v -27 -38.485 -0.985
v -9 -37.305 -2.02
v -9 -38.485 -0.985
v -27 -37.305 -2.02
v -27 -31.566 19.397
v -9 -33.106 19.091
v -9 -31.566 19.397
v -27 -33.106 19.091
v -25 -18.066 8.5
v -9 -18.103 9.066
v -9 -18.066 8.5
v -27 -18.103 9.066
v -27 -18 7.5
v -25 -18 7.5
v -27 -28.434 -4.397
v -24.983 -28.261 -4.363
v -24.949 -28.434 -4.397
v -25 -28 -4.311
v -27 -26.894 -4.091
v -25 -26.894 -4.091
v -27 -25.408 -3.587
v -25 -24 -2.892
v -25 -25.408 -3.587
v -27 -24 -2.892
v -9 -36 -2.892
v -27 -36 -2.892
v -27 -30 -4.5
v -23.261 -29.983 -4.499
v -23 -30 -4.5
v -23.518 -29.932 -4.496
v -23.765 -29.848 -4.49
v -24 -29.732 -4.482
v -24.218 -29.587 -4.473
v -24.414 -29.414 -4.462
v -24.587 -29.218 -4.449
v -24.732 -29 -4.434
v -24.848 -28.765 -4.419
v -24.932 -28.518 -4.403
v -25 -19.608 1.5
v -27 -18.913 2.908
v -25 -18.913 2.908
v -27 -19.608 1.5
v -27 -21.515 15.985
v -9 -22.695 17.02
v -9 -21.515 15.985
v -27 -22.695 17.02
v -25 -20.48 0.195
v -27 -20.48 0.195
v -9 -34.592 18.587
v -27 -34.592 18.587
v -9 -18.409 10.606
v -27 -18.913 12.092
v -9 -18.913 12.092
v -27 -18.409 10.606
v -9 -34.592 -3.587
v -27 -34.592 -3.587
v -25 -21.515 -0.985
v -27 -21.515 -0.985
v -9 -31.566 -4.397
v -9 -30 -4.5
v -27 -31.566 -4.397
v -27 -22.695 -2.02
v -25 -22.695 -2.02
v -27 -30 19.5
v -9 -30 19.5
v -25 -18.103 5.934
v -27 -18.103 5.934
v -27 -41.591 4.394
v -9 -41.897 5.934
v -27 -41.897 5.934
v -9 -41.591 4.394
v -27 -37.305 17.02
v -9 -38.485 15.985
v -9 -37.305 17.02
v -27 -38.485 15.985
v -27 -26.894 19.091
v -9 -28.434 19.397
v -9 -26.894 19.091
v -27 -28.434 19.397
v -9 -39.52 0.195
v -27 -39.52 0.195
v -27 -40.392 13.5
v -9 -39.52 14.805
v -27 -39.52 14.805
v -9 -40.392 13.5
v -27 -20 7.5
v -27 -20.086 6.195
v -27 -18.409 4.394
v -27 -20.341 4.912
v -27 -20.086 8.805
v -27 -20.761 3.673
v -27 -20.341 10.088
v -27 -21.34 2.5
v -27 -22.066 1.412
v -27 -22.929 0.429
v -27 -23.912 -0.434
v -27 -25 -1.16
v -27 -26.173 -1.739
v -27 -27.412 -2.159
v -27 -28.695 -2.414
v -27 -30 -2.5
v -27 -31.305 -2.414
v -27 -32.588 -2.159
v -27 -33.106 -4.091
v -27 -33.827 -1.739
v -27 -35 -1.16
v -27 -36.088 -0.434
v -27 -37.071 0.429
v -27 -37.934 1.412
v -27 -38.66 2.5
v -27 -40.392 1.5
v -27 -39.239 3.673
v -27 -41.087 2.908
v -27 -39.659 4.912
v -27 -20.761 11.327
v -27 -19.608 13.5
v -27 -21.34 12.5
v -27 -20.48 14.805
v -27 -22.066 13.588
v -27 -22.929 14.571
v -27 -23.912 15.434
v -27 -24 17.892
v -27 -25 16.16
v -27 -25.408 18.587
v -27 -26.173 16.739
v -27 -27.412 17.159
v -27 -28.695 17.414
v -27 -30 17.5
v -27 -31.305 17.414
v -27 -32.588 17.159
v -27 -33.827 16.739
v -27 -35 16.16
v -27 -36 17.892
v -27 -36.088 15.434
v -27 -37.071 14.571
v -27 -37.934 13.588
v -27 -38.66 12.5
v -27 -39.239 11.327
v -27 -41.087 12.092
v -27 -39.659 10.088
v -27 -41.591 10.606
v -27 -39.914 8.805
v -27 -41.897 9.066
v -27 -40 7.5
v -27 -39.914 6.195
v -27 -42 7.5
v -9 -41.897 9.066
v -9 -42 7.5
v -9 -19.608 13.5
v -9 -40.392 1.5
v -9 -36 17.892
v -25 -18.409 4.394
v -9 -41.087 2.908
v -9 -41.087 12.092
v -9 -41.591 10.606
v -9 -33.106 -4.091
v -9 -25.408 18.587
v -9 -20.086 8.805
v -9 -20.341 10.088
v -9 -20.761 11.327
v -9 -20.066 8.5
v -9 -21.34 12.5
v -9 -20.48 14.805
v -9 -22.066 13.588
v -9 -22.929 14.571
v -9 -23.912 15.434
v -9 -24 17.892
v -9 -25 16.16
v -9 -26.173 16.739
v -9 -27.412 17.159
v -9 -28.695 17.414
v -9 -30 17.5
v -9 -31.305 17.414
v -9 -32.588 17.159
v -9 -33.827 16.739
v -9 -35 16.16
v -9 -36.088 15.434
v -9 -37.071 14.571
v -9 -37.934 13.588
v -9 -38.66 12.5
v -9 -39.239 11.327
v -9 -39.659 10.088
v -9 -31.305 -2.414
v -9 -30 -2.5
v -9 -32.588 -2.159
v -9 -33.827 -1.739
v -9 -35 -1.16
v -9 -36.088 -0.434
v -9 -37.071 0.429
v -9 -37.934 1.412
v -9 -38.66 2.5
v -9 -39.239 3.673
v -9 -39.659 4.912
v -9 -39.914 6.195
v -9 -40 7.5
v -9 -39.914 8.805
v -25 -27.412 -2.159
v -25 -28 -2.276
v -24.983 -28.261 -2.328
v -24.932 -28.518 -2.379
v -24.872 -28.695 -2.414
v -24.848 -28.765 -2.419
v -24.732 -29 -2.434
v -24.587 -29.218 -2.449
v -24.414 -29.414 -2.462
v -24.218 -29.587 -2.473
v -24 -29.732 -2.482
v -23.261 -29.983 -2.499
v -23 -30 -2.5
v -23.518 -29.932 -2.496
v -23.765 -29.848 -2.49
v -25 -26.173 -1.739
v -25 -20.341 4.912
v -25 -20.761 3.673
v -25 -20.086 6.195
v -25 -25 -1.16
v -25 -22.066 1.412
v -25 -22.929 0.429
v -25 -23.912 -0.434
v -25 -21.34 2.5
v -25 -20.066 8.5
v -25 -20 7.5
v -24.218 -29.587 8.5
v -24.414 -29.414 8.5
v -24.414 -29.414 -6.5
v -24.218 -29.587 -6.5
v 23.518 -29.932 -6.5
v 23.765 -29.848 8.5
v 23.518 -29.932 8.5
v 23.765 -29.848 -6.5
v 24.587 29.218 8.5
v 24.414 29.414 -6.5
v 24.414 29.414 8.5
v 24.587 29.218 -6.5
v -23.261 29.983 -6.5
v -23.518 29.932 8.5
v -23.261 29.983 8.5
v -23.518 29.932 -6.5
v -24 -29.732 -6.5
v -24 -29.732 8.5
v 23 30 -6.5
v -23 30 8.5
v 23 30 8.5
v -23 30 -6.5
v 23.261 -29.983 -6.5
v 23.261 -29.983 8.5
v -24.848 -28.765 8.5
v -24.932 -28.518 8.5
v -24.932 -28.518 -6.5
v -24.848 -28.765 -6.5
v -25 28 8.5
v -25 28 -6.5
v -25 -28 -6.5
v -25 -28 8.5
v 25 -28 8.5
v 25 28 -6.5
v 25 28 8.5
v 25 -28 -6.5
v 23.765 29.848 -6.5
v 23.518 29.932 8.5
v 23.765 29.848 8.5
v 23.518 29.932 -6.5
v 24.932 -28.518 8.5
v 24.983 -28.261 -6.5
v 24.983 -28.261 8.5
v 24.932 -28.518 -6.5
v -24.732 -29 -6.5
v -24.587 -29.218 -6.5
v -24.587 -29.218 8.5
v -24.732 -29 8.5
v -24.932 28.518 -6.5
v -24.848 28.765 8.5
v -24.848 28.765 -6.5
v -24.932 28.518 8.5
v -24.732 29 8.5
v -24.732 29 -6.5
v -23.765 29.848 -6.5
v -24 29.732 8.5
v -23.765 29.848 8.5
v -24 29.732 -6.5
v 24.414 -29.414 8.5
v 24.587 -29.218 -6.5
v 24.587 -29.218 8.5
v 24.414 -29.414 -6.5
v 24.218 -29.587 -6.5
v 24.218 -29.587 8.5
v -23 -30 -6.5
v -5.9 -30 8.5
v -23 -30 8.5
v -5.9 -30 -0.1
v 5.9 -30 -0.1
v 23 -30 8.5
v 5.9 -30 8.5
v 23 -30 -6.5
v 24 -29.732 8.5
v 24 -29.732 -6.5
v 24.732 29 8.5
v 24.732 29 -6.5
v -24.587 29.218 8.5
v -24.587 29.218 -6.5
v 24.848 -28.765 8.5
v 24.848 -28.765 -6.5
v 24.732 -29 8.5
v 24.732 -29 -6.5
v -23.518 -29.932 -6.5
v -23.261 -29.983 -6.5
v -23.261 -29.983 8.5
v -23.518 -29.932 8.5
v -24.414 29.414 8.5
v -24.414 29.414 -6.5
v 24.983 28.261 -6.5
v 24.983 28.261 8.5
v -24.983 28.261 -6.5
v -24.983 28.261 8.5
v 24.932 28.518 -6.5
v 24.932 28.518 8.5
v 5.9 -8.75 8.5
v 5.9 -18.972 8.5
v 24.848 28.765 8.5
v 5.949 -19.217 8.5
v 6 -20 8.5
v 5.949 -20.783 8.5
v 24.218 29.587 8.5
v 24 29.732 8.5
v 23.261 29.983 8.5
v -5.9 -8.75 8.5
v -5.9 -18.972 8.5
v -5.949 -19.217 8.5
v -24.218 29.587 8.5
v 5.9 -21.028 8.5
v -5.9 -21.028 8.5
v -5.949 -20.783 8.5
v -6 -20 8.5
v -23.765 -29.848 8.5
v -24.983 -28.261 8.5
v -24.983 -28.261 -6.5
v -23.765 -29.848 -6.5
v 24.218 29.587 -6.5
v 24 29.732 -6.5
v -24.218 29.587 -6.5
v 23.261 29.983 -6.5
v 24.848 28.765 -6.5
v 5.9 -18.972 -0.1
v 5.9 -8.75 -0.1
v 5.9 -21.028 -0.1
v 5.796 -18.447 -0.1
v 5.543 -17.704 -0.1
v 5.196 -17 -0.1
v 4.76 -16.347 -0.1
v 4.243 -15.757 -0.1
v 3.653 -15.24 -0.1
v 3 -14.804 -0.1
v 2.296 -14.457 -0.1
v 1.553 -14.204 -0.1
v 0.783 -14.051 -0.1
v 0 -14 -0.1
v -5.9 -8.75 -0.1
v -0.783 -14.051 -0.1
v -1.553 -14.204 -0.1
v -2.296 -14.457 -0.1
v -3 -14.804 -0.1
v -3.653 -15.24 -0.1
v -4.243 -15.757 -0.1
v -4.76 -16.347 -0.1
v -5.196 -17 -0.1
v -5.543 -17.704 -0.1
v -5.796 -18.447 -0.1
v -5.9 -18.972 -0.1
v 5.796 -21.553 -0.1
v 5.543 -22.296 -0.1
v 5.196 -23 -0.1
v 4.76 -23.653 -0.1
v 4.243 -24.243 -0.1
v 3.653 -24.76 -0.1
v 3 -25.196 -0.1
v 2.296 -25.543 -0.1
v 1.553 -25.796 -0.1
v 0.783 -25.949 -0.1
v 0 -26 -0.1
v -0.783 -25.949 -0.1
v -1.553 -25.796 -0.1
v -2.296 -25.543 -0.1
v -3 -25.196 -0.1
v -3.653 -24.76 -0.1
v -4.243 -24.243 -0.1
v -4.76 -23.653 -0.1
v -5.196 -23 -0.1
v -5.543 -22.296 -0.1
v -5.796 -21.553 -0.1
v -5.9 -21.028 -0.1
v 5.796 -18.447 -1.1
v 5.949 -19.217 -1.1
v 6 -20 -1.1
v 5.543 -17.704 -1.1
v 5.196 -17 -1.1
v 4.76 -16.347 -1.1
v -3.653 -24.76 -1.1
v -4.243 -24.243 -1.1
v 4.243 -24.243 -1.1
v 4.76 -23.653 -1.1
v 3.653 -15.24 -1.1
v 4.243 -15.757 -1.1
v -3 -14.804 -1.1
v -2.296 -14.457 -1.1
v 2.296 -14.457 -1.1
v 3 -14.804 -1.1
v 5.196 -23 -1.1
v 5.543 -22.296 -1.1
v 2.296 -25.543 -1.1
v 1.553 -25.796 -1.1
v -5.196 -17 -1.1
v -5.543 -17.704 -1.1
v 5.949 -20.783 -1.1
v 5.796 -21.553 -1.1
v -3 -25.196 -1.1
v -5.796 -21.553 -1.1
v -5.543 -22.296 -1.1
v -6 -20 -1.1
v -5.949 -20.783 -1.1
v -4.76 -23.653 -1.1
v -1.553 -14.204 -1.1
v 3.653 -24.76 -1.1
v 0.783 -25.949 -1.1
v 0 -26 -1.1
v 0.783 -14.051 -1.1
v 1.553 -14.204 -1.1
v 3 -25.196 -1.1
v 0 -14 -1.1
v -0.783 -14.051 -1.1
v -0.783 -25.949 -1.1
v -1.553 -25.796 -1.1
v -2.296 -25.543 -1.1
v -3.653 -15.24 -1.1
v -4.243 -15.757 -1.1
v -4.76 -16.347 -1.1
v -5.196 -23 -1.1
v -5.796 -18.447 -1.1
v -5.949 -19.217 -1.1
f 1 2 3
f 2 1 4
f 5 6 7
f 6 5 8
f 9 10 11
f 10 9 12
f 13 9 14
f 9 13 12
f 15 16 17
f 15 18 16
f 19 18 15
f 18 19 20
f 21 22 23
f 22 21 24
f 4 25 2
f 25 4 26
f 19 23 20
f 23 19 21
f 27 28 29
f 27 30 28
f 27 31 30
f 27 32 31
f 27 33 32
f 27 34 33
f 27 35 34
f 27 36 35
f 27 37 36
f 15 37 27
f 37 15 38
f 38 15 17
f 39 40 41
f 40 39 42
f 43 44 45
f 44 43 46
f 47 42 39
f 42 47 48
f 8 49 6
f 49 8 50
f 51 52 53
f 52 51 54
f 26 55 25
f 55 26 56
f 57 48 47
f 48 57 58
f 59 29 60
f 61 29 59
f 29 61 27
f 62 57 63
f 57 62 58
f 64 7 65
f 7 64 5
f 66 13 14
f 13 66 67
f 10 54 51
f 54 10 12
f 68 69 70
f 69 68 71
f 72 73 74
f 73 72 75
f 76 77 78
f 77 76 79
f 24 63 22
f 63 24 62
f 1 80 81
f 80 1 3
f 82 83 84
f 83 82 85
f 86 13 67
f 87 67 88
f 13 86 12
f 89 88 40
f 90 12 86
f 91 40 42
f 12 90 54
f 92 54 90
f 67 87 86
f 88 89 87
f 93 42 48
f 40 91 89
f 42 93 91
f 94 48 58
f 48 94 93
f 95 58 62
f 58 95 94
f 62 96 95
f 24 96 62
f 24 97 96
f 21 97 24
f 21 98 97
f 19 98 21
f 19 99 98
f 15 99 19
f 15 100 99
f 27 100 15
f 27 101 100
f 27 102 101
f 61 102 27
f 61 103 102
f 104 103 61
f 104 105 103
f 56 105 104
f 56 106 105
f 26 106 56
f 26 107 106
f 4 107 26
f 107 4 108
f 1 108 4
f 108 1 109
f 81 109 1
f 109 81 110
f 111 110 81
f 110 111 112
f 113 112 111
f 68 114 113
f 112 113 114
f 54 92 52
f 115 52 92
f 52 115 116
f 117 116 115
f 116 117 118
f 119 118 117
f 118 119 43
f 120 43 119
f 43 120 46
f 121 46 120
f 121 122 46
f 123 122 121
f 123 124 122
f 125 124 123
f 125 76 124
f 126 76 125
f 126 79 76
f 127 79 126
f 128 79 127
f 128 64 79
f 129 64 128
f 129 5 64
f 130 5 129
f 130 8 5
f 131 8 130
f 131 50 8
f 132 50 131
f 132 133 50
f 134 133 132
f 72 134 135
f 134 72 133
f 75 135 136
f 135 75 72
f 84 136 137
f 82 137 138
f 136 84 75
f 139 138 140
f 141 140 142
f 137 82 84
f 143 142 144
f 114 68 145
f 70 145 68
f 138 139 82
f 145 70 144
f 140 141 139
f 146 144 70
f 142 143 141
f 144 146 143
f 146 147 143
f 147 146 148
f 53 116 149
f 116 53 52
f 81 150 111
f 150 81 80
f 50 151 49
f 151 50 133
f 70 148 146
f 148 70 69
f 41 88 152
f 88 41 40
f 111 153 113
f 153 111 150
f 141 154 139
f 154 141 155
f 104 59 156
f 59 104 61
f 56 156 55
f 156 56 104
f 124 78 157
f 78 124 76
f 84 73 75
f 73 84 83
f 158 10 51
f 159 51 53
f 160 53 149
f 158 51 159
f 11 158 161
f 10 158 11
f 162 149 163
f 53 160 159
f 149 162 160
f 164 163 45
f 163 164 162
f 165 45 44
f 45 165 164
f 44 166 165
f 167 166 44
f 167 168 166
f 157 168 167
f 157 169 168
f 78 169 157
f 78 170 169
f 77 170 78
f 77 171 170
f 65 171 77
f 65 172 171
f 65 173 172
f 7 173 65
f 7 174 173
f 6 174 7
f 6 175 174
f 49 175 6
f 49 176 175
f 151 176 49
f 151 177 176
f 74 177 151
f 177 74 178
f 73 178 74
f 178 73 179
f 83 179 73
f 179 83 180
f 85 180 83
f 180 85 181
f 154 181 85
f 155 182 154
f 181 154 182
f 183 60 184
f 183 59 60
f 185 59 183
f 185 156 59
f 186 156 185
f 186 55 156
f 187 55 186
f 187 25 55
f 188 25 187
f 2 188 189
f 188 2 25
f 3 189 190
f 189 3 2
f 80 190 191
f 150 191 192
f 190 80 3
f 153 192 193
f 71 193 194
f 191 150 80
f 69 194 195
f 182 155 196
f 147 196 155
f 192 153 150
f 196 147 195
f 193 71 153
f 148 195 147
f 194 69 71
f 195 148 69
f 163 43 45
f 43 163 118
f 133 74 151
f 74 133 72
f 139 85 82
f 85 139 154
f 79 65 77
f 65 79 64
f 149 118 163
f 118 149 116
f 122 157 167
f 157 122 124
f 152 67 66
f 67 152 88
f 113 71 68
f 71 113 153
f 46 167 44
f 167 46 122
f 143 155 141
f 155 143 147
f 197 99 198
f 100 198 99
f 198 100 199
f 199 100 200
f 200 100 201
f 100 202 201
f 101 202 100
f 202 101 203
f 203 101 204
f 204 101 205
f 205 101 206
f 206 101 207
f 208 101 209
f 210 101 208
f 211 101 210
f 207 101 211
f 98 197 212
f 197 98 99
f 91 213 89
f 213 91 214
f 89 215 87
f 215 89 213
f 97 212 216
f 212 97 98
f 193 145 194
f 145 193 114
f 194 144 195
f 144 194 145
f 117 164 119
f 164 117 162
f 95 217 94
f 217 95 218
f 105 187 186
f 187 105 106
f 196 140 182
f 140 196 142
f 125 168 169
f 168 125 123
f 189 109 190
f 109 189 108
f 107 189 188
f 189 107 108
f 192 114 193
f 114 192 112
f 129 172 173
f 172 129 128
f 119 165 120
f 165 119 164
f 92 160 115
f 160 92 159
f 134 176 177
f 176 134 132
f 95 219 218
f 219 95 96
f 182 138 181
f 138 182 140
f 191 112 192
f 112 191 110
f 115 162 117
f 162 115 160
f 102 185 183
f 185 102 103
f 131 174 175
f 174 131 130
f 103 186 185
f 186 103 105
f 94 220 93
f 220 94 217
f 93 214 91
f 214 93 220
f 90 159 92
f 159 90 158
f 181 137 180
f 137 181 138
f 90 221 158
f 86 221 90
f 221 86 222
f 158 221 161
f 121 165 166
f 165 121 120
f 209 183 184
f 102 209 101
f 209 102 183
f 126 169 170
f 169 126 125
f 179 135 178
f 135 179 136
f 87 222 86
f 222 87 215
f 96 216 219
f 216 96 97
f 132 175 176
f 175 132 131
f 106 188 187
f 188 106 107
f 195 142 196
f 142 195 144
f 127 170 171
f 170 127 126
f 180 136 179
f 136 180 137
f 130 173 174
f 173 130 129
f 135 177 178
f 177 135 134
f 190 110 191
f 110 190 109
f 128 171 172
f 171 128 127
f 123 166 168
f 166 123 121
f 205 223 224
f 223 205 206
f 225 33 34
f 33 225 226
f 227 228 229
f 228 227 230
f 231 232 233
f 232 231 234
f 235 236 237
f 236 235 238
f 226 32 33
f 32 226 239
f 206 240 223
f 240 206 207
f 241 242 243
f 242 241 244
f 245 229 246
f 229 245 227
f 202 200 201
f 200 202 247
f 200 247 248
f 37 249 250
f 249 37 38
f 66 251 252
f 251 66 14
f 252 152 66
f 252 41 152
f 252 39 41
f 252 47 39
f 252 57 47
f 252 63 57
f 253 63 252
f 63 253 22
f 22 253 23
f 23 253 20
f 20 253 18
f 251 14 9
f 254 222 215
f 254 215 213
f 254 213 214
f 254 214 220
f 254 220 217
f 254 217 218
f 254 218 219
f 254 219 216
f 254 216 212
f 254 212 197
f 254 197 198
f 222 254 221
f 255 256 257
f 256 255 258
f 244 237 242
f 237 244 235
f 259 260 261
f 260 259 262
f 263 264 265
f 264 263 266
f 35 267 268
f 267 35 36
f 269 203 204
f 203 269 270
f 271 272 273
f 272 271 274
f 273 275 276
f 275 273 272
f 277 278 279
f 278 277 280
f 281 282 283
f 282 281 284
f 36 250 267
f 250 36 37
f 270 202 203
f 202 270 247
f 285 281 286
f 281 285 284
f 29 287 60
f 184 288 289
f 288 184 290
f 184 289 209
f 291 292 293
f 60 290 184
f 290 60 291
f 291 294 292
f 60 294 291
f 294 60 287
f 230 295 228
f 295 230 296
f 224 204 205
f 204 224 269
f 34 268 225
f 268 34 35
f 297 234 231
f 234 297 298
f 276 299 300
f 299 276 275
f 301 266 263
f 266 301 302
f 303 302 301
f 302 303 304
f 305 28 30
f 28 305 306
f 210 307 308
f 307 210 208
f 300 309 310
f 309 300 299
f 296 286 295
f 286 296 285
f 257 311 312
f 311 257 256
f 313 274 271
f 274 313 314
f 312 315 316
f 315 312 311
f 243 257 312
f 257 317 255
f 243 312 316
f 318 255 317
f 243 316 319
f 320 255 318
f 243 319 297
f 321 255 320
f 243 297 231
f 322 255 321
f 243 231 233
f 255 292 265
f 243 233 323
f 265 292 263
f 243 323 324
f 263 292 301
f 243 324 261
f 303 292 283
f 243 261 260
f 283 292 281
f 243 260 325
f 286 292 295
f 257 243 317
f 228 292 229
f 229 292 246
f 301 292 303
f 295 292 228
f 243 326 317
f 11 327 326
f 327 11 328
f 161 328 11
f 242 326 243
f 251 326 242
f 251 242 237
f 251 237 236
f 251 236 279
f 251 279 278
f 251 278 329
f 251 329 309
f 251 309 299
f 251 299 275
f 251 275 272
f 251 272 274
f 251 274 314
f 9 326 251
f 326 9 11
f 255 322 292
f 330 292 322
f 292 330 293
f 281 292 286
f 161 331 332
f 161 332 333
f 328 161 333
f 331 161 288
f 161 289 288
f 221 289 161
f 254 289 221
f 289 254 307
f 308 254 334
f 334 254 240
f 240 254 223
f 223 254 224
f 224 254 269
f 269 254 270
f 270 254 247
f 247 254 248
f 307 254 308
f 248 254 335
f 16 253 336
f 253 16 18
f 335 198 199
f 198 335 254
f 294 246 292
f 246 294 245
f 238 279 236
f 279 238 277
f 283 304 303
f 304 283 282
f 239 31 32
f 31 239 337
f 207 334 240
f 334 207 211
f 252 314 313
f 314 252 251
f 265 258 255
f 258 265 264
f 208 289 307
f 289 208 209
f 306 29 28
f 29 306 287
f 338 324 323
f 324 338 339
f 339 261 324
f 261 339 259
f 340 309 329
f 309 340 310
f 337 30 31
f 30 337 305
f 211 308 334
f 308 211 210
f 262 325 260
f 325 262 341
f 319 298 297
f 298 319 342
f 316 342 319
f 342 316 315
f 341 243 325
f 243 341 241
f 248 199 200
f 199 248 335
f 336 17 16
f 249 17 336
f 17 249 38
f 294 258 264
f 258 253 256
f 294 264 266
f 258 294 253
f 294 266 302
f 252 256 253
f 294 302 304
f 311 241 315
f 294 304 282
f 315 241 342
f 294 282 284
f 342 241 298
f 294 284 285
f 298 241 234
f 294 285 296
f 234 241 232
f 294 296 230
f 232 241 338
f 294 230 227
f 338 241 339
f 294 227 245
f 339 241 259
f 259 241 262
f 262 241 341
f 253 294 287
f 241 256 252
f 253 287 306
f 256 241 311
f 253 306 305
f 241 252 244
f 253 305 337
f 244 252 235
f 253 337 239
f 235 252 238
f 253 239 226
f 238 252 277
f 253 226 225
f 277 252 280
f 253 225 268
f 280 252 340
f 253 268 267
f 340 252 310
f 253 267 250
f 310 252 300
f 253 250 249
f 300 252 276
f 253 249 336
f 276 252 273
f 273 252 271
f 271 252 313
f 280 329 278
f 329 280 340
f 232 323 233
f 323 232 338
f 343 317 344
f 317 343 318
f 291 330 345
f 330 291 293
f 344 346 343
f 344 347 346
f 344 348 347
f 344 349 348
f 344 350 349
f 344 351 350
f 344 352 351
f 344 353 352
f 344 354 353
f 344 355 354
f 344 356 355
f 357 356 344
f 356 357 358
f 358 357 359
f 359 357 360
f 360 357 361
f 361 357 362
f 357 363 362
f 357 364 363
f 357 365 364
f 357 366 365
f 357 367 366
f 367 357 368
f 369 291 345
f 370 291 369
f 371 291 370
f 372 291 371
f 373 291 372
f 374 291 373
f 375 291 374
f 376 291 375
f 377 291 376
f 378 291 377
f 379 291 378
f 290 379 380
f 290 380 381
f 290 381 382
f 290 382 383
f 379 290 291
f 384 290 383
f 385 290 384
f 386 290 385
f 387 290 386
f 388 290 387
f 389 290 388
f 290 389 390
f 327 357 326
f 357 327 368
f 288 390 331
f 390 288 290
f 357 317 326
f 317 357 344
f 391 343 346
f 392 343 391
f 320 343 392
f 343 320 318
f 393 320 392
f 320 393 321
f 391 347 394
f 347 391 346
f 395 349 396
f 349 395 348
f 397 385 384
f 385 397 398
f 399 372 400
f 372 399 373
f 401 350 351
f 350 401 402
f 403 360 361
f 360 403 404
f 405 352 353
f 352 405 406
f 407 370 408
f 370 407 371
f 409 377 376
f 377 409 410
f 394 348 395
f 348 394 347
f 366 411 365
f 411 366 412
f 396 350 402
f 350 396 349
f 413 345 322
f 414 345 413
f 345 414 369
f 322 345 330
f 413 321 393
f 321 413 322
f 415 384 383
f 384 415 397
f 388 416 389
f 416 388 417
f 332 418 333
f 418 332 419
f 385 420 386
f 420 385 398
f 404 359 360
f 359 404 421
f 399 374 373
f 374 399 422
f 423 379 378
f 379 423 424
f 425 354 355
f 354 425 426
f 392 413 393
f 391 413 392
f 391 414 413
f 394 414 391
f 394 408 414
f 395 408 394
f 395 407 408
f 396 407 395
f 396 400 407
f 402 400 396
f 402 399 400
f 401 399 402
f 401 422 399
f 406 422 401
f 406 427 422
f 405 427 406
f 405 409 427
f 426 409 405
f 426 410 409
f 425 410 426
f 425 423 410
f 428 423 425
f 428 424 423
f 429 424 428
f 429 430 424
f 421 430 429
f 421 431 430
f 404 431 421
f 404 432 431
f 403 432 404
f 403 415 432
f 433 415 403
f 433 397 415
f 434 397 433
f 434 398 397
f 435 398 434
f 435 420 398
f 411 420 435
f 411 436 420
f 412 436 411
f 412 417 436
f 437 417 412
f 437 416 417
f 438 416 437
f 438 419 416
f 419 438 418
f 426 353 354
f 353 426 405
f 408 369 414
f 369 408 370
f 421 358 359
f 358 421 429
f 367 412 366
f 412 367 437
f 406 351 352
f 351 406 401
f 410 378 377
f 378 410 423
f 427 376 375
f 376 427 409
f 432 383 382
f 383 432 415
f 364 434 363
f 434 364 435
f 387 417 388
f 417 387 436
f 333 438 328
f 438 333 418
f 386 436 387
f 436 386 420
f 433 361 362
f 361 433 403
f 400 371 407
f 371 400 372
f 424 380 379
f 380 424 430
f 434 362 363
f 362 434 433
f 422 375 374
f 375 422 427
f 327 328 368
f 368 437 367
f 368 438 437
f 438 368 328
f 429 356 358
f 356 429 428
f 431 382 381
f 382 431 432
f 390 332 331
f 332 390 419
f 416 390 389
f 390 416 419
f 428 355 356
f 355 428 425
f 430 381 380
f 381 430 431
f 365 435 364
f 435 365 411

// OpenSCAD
// ============================================================
// Palm Structure — Tendon-Driven Robotic Hand
// ============================================================
// Houses a single MG90S servo that drives all three finger
// tendons simultaneously via a central tendon pulley.
//
// Dimensions  :  60 mm (L) × 50 mm (W) × 15 mm (H)
// Servo mount : MG90S (22.5 × 11.8 × 22.7 mm body)
// Finger sockets: 3 × rectangular slots along distal edge
// Tendon channels: 3 smooth internal paths from servo pulley
//                  exit to finger socket entry holes
// Forearm mount : 20 mm PVC pipe receiver on proximal face
// ============================================================

// ---- Parameters -------------------------------------------
palm_l      = 60;    // mm — palm length (proximal–distal)
palm_w      = 50;    // mm — palm width (finger spread)
palm_h      = 15;    // mm — palm thickness
wall        =  2;    // mm — minimum wall

// MG90S servo dimensions
srv_l       = 22.5;
srv_w       = 11.8;
srv_h       = 22.7;
srv_tab_l   = 32;    // mm — tab-to-tab length
srv_tab_h   =  2.5;  // mm — tab thickness
srv_tab_w   =  4;    // mm — tab width (mounting ear)

// Finger socket (fits finger proximal-lug width + tolerance)
finger_w    = 11;    // mm — socket width
finger_h    =  8;    // mm — socket height
finger_sep  = 13;    // mm — centre-to-centre spacing
n_fingers   =  3;

// Tendon routing hole in palm exit (slightly larger than finger tendon hole)
tendon_hole_dia  =  1.6;  // mm — slightly larger than 1.35 mm

// PVC pipe receiver (forearm attachment, proximal face)
pvc_od      = 20;    // mm — PVC outer diameter
pvc_wall    =  2;    // mm — receiver socket wall

// Pin holes for finger segment attachment
pin_dia     =  2.0;
pin_tol     =  0.1;

// Pulley post (servo horn connector reference point)
pulley_x    =  0;    // centred in X
pulley_y    = 10;    // mm from proximal edge (centre of servo bay)
pulley_z    = palm_h + 2;  // mm — above palm top surface (horn height)
pulley_r    =  6;    // mm — effective tendon wrap radius

corner_r    =  2;
$fn = 48;

// ---- Derived -----------------------------------------------
pin_r = (pin_dia + pin_tol) / 2;

// Finger socket Y positions (along palm width, centred)
function finger_y(i) = -finger_sep + i * finger_sep;  // i = 0,1,2

// ============================================================
module servo_bay() {
    // Cavity for MG90S with mounting tabs
    union() {
        // Main body cavity
        translate([-srv_w/2, -srv_l/2, 0])
            cube([srv_w, srv_l, srv_h + 2]);
        // Tab recesses (left and right)
        for (dx = [-srv_tab_l/2, srv_tab_l/2 - srv_tab_w]) {
            translate([dx, -srv_tab_w/2, srv_h - srv_tab_h])
                cube([srv_tab_w, srv_tab_w, srv_tab_h + 1]);
        }
        // Horn exit hole (top)
        translate([0, 0, -1])
            cylinder(r = 6, h = palm_h + 3);
    }
}

module tendon_channel(finger_idx) {
    // Smooth curved channel from servo bay to finger socket exit.
    // Approximated as a cylinder tangent path (simplified as straight).
    fy = finger_y(finger_idx);
    hull() {
        translate([pulley_x, pulley_y, palm_h - wall - 0.1])
            cylinder(r = tendon_hole_dia/2 + 0.3, h = 0.2);
        translate([0, fy, palm_h - wall - 0.1])
            cylinder(r = tendon_hole_dia/2 + 0.3, h = 0.2);
    }
    // Vertical exit hole at finger socket
    translate([0, fy, 0])
        cylinder(r = tendon_hole_dia/2, h = palm_h + 1);
}

module finger_socket(finger_idx) {
    fy = finger_y(finger_idx);
    // Rectangular slot for proximal lug insertion
    translate([-finger_w/2, fy - finger_w/4, palm_h - finger_h])
        cube([finger_w, finger_w/2 + 0.5, finger_h + 1]);
    // Pin hole (horizontal, through socket walls)
    translate([0, fy, palm_h - finger_h/2])
        rotate([0, 90, 0])
            cylinder(r = pin_r, h = finger_w + 2, center = true);
}

module pvc_receiver() {
    // Cylindrical socket on proximal face for 20 mm PVC pipe
    translate([-palm_w/2 - pvc_wall, 0, palm_h/2])
        rotate([0, 90, 0]) {
            difference() {
                cylinder(r = pvc_od/2 + pvc_wall, h = 18);
                cylinder(r = pvc_od/2, h = 20);
            }
        }
}

// ============================================================
// Main palm body
// ============================================================
difference() {
    union() {
        // Main palm block (rounded)
        minkowski() {
            cube([palm_w - 2*corner_r,
                  palm_l - 2*corner_r,
                  palm_h - corner_r], center = true);
            cylinder(r = corner_r, h = corner_r, center = false);
        }
        // PVC receiver boss on proximal face
        translate([0, -palm_l/2, 0])
            pvc_receiver();
    }

    // Servo bay (centred in X, offset toward proximal side)
    translate([pulley_x, pulley_y - palm_l/2, -0.1])
        servo_bay();

    // Tendon channels & finger socket exit holes
    for (i = [0 : n_fingers - 1]) {
        translate([0, -palm_l/2, 0]) {
            tendon_channel(i);
            finger_socket(i);
        }
    }

    // Cable exit slot on proximal face (servo wire routing)
    translate([-3, -palm_l/2 - 0.1, 2])
        cube([6, wall + 0.2, palm_h - 3]);
}
